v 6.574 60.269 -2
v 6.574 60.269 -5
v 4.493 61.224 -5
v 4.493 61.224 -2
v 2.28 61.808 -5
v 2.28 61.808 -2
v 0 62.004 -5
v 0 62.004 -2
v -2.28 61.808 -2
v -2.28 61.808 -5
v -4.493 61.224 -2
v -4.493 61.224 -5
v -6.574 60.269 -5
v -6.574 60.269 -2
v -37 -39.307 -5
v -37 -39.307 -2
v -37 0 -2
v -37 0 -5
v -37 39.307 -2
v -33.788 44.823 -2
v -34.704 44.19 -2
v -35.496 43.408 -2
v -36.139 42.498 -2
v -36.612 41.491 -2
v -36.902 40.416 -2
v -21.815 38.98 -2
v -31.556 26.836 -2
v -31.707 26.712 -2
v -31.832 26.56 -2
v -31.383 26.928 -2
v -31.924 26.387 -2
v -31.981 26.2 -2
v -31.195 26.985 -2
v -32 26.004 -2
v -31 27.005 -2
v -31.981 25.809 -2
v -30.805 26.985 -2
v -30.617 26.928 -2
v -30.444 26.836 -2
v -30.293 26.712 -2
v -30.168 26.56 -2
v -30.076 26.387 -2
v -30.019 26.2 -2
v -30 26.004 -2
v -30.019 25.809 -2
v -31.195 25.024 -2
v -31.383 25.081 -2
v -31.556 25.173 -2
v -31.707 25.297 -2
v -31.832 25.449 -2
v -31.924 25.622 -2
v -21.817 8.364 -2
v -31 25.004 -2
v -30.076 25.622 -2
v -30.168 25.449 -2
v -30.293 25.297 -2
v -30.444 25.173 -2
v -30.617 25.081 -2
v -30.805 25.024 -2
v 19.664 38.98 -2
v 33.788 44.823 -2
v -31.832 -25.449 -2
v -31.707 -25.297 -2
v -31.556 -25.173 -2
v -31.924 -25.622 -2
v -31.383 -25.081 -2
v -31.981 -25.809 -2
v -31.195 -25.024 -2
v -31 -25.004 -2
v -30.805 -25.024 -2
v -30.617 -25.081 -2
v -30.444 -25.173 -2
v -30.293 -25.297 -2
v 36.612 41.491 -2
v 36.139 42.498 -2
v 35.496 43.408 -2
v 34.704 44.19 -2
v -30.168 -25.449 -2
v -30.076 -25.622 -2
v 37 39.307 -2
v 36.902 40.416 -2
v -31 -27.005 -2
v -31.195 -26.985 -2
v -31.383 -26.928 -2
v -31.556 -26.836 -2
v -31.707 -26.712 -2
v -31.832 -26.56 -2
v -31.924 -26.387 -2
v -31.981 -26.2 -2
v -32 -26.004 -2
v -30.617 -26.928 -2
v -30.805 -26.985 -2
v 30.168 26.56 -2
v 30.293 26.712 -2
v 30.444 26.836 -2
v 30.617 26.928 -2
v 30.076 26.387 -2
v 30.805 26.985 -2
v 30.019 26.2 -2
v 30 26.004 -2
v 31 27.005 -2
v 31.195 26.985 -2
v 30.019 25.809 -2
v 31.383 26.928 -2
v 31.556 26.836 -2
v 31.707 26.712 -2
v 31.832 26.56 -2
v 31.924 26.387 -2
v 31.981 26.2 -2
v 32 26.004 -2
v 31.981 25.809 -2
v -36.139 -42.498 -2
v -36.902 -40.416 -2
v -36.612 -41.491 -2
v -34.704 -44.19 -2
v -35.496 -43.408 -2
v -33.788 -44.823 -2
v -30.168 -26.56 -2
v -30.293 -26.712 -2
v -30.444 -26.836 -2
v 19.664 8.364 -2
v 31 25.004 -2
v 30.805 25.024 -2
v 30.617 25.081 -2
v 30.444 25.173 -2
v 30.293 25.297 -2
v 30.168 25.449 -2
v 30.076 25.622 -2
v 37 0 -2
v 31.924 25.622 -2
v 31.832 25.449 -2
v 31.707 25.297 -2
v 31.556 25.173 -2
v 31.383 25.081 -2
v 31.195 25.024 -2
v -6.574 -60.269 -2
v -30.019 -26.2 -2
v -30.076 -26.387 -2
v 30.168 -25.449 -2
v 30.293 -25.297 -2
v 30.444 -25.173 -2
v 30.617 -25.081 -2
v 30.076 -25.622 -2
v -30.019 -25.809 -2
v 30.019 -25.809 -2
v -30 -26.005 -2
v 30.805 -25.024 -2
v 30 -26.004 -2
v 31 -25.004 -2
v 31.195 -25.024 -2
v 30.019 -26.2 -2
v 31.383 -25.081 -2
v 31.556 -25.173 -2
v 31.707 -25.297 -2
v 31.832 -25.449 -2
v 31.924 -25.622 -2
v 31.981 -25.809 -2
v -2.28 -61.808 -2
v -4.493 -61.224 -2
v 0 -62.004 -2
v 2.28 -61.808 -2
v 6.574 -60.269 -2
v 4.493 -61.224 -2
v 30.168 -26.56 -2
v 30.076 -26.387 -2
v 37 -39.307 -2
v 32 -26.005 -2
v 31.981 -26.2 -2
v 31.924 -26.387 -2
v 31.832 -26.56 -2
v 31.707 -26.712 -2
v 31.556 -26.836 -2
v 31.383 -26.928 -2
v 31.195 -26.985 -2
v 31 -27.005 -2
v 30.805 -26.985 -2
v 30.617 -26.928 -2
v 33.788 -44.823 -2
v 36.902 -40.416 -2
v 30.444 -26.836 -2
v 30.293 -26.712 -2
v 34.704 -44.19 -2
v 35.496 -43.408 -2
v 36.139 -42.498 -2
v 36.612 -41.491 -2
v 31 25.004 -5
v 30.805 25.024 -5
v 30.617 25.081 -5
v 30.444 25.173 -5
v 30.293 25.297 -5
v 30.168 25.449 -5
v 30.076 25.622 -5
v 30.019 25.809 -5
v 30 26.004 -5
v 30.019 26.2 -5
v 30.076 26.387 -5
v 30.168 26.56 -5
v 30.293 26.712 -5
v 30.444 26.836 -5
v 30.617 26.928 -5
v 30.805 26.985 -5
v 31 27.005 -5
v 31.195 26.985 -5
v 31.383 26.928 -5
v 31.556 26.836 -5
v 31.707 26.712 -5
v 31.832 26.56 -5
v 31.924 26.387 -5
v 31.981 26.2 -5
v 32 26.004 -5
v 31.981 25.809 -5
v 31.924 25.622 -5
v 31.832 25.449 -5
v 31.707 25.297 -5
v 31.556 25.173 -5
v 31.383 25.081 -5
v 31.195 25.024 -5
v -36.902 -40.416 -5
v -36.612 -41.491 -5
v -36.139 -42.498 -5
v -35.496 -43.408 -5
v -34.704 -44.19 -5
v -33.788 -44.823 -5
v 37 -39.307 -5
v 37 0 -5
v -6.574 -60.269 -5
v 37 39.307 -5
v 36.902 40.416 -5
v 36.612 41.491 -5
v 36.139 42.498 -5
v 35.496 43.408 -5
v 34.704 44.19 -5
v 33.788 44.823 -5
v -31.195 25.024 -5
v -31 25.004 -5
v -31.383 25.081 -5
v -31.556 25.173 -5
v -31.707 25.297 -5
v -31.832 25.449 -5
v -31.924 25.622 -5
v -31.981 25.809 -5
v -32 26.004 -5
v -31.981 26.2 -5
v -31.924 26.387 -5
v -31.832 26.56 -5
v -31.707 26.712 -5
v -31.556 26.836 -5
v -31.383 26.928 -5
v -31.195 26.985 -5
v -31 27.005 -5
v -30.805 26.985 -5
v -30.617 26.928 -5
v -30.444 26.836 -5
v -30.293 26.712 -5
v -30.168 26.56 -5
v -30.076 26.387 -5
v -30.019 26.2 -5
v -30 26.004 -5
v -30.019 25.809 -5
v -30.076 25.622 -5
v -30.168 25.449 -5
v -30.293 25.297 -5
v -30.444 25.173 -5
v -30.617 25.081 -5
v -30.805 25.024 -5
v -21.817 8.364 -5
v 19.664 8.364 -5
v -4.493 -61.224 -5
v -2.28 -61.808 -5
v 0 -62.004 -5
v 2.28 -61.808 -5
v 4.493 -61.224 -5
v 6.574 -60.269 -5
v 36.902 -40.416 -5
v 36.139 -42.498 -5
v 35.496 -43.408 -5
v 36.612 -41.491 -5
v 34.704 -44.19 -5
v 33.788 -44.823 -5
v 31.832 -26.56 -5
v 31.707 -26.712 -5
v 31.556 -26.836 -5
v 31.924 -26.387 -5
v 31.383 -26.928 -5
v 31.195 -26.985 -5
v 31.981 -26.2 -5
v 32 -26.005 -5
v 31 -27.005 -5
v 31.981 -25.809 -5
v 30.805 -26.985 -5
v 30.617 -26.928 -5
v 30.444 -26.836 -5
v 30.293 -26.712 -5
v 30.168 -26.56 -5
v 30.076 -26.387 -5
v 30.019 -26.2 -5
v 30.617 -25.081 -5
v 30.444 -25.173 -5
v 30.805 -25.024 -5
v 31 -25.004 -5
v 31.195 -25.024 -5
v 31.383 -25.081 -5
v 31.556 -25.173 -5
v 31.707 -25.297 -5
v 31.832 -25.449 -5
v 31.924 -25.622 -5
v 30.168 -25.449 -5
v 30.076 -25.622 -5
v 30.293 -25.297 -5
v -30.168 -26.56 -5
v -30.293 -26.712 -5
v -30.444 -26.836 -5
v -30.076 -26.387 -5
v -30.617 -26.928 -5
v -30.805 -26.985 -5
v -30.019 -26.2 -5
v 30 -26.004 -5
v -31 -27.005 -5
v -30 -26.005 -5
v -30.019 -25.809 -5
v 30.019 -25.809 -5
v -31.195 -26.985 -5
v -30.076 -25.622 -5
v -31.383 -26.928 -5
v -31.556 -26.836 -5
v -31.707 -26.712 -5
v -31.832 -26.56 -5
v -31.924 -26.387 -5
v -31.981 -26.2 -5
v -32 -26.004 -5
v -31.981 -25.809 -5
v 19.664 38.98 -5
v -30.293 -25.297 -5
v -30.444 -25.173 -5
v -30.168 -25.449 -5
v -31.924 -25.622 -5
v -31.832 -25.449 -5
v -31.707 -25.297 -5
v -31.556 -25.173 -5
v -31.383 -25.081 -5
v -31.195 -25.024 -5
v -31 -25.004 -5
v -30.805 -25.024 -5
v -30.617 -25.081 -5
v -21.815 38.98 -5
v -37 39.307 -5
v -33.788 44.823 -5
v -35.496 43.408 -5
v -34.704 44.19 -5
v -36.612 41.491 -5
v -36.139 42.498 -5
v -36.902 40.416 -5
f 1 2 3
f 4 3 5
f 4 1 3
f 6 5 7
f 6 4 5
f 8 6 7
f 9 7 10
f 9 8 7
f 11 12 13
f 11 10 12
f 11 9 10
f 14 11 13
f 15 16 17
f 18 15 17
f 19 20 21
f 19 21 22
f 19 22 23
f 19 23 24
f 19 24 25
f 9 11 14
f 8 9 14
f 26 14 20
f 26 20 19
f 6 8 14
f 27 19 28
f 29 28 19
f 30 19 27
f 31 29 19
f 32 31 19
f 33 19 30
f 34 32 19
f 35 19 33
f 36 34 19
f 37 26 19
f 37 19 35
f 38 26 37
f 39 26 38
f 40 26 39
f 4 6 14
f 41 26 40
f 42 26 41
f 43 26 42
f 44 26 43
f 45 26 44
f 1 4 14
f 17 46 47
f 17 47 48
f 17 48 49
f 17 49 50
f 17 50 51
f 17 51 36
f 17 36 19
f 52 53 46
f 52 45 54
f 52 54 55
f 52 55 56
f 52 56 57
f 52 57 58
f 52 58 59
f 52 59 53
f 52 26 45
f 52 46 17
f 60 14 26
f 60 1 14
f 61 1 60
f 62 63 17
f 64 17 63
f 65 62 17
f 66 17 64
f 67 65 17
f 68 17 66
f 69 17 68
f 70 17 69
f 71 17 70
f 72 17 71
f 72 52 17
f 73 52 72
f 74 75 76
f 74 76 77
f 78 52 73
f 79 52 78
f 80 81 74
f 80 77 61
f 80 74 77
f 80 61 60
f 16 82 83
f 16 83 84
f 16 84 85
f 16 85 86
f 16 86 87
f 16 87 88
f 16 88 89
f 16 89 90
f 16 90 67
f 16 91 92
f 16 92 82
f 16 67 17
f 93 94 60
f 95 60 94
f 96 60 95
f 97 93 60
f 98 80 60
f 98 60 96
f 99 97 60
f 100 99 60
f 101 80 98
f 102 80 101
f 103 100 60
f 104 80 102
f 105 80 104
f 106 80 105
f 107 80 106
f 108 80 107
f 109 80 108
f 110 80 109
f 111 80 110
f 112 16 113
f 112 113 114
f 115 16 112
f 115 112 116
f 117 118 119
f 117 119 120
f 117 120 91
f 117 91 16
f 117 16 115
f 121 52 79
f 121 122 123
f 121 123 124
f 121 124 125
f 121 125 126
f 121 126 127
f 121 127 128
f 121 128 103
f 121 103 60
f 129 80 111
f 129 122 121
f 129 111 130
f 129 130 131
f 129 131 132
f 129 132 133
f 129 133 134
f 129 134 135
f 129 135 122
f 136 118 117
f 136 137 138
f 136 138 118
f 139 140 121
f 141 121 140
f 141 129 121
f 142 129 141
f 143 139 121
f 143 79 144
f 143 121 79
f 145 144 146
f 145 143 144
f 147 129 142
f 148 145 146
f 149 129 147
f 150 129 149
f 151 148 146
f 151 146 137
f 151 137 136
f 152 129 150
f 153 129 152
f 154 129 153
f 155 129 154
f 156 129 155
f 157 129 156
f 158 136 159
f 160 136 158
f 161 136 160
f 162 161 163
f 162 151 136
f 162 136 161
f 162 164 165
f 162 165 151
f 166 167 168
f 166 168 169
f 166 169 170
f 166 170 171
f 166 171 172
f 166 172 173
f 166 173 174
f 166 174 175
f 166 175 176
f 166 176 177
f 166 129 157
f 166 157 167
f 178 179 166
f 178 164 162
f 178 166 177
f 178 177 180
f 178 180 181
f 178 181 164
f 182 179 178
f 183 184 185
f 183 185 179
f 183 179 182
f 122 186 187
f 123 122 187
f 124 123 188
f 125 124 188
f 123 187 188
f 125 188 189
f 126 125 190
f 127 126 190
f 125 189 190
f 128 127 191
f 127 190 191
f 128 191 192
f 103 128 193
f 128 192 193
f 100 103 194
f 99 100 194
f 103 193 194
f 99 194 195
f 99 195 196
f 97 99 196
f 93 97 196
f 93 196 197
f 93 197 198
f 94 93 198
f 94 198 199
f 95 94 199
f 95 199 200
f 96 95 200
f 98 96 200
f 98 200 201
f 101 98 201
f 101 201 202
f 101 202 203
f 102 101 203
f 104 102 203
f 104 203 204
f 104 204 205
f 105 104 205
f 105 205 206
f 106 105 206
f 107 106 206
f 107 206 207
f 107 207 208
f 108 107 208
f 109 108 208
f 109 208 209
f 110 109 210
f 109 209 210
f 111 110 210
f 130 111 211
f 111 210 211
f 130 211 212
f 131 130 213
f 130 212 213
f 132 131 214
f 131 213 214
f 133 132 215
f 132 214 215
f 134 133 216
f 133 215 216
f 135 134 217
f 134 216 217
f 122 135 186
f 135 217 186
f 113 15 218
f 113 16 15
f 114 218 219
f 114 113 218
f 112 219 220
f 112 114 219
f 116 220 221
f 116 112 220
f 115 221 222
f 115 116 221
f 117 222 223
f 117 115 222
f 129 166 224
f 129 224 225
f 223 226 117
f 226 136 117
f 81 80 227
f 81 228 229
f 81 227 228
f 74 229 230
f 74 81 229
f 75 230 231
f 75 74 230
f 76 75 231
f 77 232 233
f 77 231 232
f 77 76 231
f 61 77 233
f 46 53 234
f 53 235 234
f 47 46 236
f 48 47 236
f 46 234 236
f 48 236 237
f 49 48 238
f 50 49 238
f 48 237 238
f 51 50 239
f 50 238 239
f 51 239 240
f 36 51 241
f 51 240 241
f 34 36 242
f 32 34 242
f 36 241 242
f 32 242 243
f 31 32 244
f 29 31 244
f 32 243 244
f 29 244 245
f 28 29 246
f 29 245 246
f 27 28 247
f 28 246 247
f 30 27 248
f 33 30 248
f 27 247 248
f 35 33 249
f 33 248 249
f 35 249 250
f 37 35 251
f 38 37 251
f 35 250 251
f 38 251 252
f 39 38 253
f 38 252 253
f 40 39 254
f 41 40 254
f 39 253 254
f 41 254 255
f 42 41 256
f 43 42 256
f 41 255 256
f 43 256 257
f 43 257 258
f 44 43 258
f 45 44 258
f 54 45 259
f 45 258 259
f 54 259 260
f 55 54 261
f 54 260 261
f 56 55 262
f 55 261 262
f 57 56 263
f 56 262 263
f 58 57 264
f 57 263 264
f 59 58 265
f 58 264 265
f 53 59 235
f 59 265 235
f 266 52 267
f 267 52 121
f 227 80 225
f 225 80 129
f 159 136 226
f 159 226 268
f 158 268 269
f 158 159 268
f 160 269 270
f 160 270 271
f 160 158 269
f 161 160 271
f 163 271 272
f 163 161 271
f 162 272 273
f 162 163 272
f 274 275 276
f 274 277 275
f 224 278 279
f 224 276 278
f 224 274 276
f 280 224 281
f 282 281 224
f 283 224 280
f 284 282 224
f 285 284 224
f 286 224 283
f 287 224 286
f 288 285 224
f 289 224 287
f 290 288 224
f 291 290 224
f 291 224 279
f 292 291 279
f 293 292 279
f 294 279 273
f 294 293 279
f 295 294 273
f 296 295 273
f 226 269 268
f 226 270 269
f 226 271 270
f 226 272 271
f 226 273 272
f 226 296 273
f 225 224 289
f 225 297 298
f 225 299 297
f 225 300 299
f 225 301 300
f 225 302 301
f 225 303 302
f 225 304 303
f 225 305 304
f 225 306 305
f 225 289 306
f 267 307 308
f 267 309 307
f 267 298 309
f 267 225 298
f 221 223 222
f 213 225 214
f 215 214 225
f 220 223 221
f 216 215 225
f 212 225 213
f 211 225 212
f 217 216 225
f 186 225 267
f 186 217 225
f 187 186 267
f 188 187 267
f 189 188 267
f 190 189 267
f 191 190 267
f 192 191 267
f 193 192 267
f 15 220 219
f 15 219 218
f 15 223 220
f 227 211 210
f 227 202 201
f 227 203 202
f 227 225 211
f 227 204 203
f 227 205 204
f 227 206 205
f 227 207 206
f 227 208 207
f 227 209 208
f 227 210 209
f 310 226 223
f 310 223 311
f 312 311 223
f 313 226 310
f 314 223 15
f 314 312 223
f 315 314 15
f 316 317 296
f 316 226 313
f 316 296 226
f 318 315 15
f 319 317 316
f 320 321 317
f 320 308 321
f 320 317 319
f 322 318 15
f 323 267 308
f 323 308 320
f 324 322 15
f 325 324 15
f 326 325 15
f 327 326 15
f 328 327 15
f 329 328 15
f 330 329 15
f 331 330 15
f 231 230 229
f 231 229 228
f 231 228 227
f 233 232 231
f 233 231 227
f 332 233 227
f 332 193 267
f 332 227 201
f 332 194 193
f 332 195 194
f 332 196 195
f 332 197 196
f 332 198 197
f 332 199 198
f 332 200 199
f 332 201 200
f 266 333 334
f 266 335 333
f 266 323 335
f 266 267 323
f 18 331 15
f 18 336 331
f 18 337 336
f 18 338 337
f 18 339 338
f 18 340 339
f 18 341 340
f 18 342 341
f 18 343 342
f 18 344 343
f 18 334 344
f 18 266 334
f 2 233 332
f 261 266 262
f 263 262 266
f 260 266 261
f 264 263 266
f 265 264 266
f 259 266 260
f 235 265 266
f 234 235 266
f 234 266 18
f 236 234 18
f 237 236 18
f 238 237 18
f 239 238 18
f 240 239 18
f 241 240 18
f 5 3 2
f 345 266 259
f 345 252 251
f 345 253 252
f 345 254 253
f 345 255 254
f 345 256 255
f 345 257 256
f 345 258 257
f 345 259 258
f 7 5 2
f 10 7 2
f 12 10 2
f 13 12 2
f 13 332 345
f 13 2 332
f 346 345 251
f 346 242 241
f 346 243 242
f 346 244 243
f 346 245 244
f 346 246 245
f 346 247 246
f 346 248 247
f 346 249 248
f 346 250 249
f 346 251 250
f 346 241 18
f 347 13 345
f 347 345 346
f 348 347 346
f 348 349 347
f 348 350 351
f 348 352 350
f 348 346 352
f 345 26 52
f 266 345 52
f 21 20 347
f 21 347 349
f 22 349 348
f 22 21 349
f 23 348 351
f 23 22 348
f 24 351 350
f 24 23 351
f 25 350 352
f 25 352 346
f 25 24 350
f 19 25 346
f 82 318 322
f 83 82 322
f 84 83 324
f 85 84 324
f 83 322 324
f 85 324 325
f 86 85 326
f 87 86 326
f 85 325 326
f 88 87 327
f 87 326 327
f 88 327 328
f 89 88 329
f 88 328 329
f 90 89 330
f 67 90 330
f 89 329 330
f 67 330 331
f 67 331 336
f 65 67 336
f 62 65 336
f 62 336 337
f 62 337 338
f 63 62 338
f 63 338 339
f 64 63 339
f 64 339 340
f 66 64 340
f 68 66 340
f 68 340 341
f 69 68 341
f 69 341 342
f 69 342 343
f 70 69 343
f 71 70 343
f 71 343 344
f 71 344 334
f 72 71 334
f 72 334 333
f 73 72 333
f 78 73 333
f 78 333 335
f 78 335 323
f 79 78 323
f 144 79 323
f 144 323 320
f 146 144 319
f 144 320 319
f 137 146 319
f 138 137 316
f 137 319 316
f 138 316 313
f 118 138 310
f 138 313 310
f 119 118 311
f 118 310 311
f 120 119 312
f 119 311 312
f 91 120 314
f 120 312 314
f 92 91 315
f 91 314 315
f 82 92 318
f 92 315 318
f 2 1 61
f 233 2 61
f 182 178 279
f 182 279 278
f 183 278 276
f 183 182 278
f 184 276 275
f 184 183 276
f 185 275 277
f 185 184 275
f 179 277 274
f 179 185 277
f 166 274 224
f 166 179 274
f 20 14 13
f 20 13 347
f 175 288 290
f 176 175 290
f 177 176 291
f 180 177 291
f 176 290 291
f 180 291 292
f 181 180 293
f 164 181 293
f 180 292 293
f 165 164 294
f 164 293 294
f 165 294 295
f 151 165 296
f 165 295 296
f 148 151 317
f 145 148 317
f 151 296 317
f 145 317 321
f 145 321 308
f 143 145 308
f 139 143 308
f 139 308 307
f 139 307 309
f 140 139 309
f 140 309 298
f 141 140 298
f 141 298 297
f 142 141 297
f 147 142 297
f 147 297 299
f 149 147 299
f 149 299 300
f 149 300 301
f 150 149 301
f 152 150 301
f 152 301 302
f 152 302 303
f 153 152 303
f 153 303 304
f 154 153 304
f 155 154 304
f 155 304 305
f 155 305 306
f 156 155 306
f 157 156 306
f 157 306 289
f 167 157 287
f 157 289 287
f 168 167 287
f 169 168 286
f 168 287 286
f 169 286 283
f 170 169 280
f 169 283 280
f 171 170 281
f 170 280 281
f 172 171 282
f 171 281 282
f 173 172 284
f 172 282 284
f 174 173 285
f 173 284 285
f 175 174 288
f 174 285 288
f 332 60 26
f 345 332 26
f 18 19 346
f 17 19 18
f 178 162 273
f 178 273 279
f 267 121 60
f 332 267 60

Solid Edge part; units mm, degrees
sketch "Sketch1" plane through (0, 0, 0) normal (0, 0, 1) x (1, 0, 0)
  line L0 (-35, -40) -> (35, -40)
  line L1 (35, -40) -> (35, 40)
  line L2 (35, 40) -> (-35, 40)
  line L3 (-35, 40) -> (-35, -40)
extrude "Protrusion1" add sketch "Sketch1" along normal blind 25
sketch "Sketch2" plane through (0, -40, 12.5) normal (0, -1, 0) x (1, 0, 0)
  line L0 (-24, 8.5) -> (-24, 2.5)
  line L1 (-24, 2.5) -> (0, 2.5)
  line L2 (24, 2.5) -> (0, 2.5)
  line L3 (24, 8.5) -> (24, 2.5)
  line L4 (20, 8.5) -> (24, 8.5)
  line L5 (20, 12.5) -> (20, 8.5)
  line L6 (20, 12.5) -> (0, 12.5)
  line L7 (-20, 12.5) -> (0, 12.5)
  line L8 (-20, 12.5) -> (-20, 8.5)
  line L9 (-20, 8.5) -> (-24, 8.5)
extrude "ExtrudedCutout_1" cut sketch "Sketch2" against normal blind 70
sketch "Sketch3" plane through (35, 0, 12.5) normal (1, 0, 0) x (0, 1, 0)
  line L0 (-17, 12.5) -> (-40, 12.5)
  line L1 (-40, 12.5) -> (-40, 2.5)
  line L2 (-40, 2.5) -> (-29, 2.5)
  line L3 (-29, 2.5) -> (-17, 12.5)
extrude "ExtrudedCutout_2" cut sketch "Sketch3" against normal blind 153.7771
sketch "Sketch4" plane through (0, -5, 15) normal (0, 0, 1) x (1, 0, 0)
  line L0 (-35, -24) -> (-35, -35)
  line L1 (-35, -35) -> (-16, -35)
  line L2 (-21, -24) -> (-16, -35)
  line L3 (-35, -24) -> (-21, -24)
  line L4 (21, -24) -> (16, -35)
  line L5 (35, -35) -> (16, -35)
  line L6 (35, -24) -> (35, -35)
  line L7 (21, -24) -> (35, -24)
extrude "ExtrudedCutout_3" cut sketch "Sketch4" against normal blind 32.0943
fillet "Round_1" radius 4 10 edges at (-35, -29, 7.5) (-28, -29, 0) (35, -29, 7.5) (28, -29, 0) (-18.5, -34.5, 0) (18.5, -34.5, 0) (0, -40, 0) (0, -40, 15) (-18.5, -34.5, 15) (18.5, -34.5, 15)
sketch "Sketch5" plane through (0, -3, 15) normal (0, 0, 1) x (1, 0, 0)
  line L0 (0, 22) -> (-14.5, 22)
  line L1 (-14.5, 36.4868) -> (-14.5, 22)
  line L2 (-14.5, 36.4868) -> (14.5, 36.4868)
  line L3 (14.5, 36.4868) -> (14.5, 22)
  line L4 (0, 22) -> (14.5, 22)
extrude "ExtrudedProtrusion_2" add sketch "Sketch5" along normal blind 10
sketch "Sketch6" plane through (0, 19, 20) normal (0, -1, 0) x (1, 0, 0)
  line L0 (-4.5, 4) -> (-4.5, -5)
  line L1 (-4.5, -5) -> (-3.5, -5)
  line L2 (-3.5, -5) -> (-3.5, 4)
  line L3 (-3.5, 4) -> (-4.5, 4)
  line L4 (-12.5, 4) -> (-12.5, -5)
  line L5 (-11.5, -5) -> (-12.5, -5)
  line L6 (-11.5, 4) -> (-11.5, -5)
  line L7 (-12.5, 4) -> (-11.5, 4)
  line L8 (11.5, 4) -> (11.5, -5)
  line L9 (11.5, -5) -> (12.5, -5)
  line L10 (12.5, -5) -> (12.5, 4)
  line L11 (12.5, 4) -> (11.5, 4)
extrude "Cutout1" cut sketch "Sketch6" against normal up to vertex (11 mm away)
sketch "Sketch7" plane through (0, 2, 0) normal (0, 0, -1) x (1, 0, 0)
  line L0 (14.5, -28) -> (-14.5, -28)
  line L1 (-14.5, -28) -> (-14.5, -21.6722)
  line L2 (-14.5, -21.6722) -> (14.5, -21.6722)
  line L3 (14.5, -21.6722) -> (14.5, -28)
extrude "ExtrudedCutout_6" cut sketch "Sketch7" against normal blind 20
sketch "Sketch8" plane through (0, 2, 0) normal (0, 0, -1) x (1, 0, 0)
  line L0 (-6.5737, 62.269) -> (-33.7882, 46.8229)
  arc A0 (-33.7882, 46.8229) -> (-37, 41.3069) centre (-30.6575, 41.3069) ccw
  line L1 (-37, 41.3069) -> (-37, 2)
  line L2 (-37, -37.3069) -> (-37, 2)
  arc A1 (-33.7882, -42.8229) -> (-37, -37.3069) centre (-30.6575, -37.3069) cw
  line L3 (-6.5737, -58.269) -> (-33.7882, -42.8229)
  arc A2 (-6.5737, -58.269) -> (0, -60.0045) centre (0, -46.6867) ccw
  arc A3 (6.5737, -58.269) -> (0, -60.0045) centre (0, -46.6867) cw
  line L4 (6.5737, -58.269) -> (33.7882, -42.8229)
  arc A4 (33.7882, -42.8229) -> (37, -37.3069) centre (30.6575, -37.3069) ccw
  line L5 (37, -37.3069) -> (37, 2)
  line L6 (37, 41.3069) -> (37, 2)
  arc A5 (33.7882, 46.8229) -> (37, 41.3069) centre (30.6575, 41.3069) cw
  line L7 (6.5737, 62.269) -> (33.7882, 46.8229)
  arc A6 (6.5737, 62.269) -> (0, 64.0045) centre (0, 50.6867) ccw
  arc A7 (-6.5737, 62.269) -> (0, 64.0045) centre (0, 50.6867) cw
extrude "ExtrudedProtrusion_3" add sketch "Sketch8" along normal blind 5
sketch "Sketch9" plane through (0, -3, 15) normal (0, 0, 1) x (0, -1, 0)
  line L0 (33, 13) -> (25, 13)
  line L1 (25, 13) -> (25, -13)
  line L2 (25, -13) -> (33, -13)
  line L3 (33, -13) -> (33, 0)
  line L4 (33, 0) -> (33, 13)
extrude "Cutout2" cut sketch "Sketch9" against normal blind 5
fillet "Round_2" radius 4 3 edges at (35, 40, 12.5) (0, 40, 25) (-35, 40, 12.5)
fillet "Round_3" radius 2 12 edges at (-20.181, -52.5459, 0) (-36.1385, -42.4984, 0) (-37, 0, 0) (-36.1385, 42.4984, 0) (-20.181, 52.5459, 0) (0, 62.0045, 0) (20.181, 52.5459, 0) (36.1385, 42.4984, 0) (37, 0, 0) (36.1385, -42.4984, 0) (20.181, -52.5459, 0) (0, -62.0045, 0)
sketch "Sketch10" plane through (0, 0, -5) normal (0, 0, -1) x (0, -1, 0)
  circle A0 centre (-26.0045, 31) radius 1.0001
  circle A1 centre (26.0045, 31) radius 1.0001
  circle A2 centre (-26.0045, -31) radius 1.0001
  circle A3 centre (26.0045, -31) radius 1.0001
extrude "ExtrudedCutout_9" cut sketch "Sketch10" against normal blind 10
sketch "Sketch11" plane through (-35, 5.5, 12.5) normal (-1, 0, 0) x (0, -1, 0)
  line L0 (-60.0023, -4.5) -> (-60.0023, -14.5)
  line L1 (-60.0023, -14.5) -> (90.1927, -14.5)
  line L2 (90.1927, -4.5) -> (90.1927, -14.5)
  line L3 (90.1927, 27.3922) -> (90.1927, -4.5)
  line L4 (-13.5, 27.3922) -> (90.1927, 27.3922)
  line L5 (-13.5, 27.3922) -> (-60.0023, 27.3922)
  line L6 (-60.0023, 27.3922) -> (-60.0023, -4.5)
extrude "Cutout3" cut sketch "Sketch11" along normal mid plane 351.619
sketch "Sketch12" plane through (0, 0, -5) normal (0, 0, -1) x (0, -1, 0)
  line L0 (-38.9803, 21.8154) -> (-8.3641, 21.8173)
  line L1 (-8.3641, 21.8173) -> (-8.3641, -19.6643)
  line L2 (-8.3641, -19.6643) -> (-38.9803, -19.6643)
  line L3 (-38.9803, -19.6643) -> (-38.9803, 21.8154)
extrude "ExtrudedCutout_13" cut sketch "Sketch12" along normal mid plane 51.4806
